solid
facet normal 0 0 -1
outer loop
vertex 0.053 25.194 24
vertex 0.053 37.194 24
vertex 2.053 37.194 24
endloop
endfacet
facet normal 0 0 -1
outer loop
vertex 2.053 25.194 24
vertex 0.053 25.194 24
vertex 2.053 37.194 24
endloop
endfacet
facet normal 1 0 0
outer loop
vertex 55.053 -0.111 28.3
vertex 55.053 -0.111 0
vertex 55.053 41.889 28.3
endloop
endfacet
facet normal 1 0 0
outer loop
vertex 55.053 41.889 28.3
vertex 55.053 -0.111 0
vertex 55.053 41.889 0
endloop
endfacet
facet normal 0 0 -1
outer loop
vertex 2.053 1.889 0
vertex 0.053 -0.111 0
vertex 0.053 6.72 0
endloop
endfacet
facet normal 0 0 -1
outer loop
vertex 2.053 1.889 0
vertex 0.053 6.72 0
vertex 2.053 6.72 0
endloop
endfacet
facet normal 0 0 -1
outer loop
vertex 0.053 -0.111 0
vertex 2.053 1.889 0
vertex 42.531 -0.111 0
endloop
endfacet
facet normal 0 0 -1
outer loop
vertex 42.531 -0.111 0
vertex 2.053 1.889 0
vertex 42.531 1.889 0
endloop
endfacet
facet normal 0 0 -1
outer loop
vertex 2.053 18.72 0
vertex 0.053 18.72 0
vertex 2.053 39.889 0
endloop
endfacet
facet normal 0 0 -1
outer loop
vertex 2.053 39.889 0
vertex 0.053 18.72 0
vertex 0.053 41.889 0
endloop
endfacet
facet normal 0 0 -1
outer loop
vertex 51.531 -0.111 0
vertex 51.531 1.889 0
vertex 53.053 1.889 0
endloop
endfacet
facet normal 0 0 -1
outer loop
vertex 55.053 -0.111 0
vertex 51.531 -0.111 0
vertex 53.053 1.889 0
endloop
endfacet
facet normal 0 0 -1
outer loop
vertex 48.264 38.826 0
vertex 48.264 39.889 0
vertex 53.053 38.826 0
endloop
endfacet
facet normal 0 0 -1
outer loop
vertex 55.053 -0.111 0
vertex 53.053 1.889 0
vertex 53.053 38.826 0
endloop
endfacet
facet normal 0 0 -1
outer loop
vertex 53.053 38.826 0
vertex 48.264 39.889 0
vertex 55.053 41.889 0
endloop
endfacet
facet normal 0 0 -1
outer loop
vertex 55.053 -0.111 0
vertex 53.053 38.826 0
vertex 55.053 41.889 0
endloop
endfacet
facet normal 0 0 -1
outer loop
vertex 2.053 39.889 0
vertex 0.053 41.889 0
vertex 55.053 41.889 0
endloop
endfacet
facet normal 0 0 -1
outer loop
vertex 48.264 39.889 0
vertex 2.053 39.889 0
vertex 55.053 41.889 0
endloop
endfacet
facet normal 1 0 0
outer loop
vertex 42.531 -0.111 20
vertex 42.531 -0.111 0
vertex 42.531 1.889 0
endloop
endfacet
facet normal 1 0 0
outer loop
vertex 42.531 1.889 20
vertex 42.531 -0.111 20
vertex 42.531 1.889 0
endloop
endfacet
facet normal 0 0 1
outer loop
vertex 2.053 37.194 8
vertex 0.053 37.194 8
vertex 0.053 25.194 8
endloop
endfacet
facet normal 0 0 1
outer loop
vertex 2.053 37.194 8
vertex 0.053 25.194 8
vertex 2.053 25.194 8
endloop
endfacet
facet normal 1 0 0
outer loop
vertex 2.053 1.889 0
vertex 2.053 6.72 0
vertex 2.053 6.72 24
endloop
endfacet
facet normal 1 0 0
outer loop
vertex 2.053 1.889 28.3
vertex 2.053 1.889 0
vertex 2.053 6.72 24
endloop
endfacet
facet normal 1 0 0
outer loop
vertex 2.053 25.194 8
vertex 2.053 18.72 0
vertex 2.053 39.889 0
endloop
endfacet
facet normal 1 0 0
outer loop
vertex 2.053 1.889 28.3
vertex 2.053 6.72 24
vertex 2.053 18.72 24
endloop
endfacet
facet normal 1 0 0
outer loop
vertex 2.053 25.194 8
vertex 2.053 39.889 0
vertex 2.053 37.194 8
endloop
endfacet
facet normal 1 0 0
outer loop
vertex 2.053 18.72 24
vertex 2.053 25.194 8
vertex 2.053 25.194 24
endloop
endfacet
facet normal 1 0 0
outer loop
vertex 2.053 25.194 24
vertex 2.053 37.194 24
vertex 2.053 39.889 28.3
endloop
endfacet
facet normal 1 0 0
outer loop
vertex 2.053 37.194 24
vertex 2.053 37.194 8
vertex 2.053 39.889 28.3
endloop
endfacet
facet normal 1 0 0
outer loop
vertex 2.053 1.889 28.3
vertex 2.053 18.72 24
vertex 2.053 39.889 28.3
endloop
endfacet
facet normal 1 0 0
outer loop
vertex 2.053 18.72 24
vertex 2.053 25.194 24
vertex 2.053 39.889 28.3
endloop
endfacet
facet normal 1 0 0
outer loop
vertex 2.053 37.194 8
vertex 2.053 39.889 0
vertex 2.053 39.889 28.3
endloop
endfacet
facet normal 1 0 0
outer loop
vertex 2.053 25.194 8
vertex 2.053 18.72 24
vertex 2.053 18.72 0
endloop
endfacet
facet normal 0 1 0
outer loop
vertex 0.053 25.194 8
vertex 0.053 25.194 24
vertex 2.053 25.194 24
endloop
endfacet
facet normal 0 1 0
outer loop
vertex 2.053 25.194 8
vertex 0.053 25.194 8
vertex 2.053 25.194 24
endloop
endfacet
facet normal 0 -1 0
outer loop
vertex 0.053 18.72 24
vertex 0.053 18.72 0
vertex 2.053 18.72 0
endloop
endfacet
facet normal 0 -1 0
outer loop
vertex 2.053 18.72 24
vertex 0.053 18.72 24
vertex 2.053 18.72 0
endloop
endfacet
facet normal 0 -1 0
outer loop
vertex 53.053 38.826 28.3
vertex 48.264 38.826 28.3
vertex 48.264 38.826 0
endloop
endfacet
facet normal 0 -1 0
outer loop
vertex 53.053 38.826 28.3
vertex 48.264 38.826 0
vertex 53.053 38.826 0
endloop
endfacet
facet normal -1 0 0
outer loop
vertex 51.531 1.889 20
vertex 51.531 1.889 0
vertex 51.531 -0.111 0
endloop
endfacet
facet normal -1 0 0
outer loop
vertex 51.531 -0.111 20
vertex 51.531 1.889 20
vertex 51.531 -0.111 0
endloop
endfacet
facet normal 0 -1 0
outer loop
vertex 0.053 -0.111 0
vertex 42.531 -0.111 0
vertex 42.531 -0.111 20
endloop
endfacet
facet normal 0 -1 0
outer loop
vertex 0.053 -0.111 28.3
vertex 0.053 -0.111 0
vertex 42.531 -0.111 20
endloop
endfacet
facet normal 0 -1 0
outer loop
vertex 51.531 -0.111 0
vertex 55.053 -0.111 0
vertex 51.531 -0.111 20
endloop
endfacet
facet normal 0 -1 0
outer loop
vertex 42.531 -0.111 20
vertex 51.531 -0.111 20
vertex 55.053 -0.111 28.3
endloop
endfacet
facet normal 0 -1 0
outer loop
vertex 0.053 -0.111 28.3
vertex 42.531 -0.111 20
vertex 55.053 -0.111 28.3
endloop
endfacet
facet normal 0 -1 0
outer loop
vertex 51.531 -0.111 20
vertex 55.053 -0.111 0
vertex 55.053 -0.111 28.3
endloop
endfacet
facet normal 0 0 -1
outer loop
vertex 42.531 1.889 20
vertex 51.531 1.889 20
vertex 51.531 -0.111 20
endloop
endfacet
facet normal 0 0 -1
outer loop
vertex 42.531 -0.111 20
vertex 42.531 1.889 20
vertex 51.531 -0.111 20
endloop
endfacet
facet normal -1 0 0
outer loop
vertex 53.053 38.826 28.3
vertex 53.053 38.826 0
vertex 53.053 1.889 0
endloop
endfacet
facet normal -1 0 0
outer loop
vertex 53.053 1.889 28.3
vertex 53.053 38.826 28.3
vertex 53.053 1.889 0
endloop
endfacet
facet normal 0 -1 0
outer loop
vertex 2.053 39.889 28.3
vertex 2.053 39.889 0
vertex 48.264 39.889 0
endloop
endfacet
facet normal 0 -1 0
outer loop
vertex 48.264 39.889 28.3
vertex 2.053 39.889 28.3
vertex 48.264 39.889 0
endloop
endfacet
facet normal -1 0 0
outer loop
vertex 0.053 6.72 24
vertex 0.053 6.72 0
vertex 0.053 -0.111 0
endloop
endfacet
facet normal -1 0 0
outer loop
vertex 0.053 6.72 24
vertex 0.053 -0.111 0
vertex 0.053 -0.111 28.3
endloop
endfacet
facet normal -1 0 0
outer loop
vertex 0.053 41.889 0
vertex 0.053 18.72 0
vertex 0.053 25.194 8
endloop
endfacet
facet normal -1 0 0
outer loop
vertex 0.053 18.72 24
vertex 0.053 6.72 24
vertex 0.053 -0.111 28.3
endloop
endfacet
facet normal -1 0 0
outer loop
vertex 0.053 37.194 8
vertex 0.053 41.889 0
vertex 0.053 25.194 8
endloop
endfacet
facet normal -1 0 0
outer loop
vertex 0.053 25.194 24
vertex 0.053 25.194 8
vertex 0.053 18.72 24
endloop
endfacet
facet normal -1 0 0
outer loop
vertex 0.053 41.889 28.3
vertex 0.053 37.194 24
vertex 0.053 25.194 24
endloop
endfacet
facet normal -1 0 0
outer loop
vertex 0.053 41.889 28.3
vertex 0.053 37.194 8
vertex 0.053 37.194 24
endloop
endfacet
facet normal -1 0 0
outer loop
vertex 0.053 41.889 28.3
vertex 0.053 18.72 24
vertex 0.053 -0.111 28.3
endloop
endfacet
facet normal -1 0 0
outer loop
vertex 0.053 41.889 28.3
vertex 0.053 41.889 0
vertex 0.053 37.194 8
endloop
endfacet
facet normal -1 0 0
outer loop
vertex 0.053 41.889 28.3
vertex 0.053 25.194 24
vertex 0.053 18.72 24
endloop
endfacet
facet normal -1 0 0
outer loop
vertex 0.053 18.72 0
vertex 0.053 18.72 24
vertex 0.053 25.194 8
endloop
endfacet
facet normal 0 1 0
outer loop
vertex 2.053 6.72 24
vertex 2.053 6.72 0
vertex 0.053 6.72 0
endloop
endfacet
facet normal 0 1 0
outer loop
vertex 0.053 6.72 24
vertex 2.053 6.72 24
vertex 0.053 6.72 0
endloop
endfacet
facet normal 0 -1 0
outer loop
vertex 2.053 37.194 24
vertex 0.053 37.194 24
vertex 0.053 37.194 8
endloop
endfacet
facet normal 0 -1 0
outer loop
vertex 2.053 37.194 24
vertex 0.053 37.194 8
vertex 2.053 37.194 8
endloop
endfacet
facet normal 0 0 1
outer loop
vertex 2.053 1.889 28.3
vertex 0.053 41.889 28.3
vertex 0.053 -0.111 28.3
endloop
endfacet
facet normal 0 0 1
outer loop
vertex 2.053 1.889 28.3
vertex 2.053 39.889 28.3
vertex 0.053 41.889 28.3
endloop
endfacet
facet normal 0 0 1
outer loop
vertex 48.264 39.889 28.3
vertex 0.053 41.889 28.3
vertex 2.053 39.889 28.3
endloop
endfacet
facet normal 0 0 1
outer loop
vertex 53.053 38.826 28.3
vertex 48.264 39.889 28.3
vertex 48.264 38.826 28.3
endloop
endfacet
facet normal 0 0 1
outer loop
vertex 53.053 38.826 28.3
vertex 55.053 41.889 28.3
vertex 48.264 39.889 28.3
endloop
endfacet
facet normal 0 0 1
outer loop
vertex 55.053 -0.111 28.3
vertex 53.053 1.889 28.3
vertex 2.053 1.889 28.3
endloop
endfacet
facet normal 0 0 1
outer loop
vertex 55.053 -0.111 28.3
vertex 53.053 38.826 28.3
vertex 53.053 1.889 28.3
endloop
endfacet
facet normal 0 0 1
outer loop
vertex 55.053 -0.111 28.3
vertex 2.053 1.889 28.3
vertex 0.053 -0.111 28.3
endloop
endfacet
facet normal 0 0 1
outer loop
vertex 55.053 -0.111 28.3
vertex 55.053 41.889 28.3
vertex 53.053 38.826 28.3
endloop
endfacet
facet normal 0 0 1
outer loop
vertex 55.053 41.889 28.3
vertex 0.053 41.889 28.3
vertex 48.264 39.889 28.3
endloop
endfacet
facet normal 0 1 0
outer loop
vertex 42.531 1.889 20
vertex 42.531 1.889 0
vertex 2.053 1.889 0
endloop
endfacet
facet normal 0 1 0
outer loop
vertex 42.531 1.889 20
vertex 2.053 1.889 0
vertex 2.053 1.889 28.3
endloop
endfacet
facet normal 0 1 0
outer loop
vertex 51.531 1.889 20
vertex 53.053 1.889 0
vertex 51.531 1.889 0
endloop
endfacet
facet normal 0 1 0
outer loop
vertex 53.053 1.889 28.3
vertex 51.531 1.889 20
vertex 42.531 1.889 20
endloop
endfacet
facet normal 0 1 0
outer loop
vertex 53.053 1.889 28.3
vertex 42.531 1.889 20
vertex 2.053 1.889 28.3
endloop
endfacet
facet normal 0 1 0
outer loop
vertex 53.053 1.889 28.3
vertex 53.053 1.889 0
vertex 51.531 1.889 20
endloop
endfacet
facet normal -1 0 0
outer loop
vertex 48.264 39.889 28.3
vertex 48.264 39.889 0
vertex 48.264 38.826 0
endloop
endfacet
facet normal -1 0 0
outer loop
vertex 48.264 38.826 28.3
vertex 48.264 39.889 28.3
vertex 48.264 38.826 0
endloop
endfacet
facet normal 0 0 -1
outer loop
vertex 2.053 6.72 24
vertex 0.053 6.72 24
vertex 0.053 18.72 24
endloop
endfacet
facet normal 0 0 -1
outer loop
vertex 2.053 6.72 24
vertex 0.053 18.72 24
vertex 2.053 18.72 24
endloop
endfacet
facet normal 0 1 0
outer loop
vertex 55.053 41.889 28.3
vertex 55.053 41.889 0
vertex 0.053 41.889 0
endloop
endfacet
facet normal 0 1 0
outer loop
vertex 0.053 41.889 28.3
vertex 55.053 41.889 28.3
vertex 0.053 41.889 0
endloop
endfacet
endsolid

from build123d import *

# Parameters (mm, degrees)
F0_W     = 2
F0_H     = 6.473958
F1_DEPTH = 28.3
F2_W     = 2
F2_H     = 8
F3_DEPTH = 12
F4_W     = 2
F4_H     = 4.3
F5_DEPTH = 35
F6_W     = 2
F6_H     = 8.3
F7_DEPTH = 25


with BuildPart() as f1:
    # F0 (on Top) → F1 (new body)
    with BuildSketch(Plane.XY):
        Polygon((55.053259, 41.889014), (0.053259, 41.889014), (0.053259, 37.194386), (2.053259, 37.194386), (2.053259, 39.889014), (48.263833, 39.889014), (48.263833, 38.826488), (53.053259, 38.826488), (53.053259, 1.889014), (51.531006, 1.889014), (51.531006, -0.110986), (55.053259, -0.110986), align=None)
        Polygon((0.053259, 6.720428), (0.053259, -0.110986), (42.531006, -0.110986), (42.531006, 1.889014), (2.053259, 1.889014), (2.053259, 6.720428), align=None)
        with Locations((1.053259, 21.957407)):
            Rectangle(F0_W, F0_H)
    extrude(amount=F1_DEPTH)

    # F2 (on face) → F3 (join)
    with BuildSketch(Plane.XZ.offset(-37.194386)):
        with Locations((1.053259, 4)):
            Rectangle(F2_W, F2_H)
    extrude(amount=F3_DEPTH)

    # F4 (on face) → F5 (join)
    with BuildSketch(Plane.XZ.offset(-37.194386)):
        with Locations((1.053259, 26.15)):
            Rectangle(F4_W, F4_H)
    extrude(amount=F5_DEPTH)

    # F6 (on face) → F7 (join)
    with BuildSketch(Plane(origin=(51.531006, 0, 0), x_dir=(0, -1, 0), z_dir=(-1, 0, 0))):
        with Locations((-0.889014, 24.15)):
            Rectangle(F6_W, F6_H)
    extrude(amount=F7_DEPTH)


solid = f1.part
